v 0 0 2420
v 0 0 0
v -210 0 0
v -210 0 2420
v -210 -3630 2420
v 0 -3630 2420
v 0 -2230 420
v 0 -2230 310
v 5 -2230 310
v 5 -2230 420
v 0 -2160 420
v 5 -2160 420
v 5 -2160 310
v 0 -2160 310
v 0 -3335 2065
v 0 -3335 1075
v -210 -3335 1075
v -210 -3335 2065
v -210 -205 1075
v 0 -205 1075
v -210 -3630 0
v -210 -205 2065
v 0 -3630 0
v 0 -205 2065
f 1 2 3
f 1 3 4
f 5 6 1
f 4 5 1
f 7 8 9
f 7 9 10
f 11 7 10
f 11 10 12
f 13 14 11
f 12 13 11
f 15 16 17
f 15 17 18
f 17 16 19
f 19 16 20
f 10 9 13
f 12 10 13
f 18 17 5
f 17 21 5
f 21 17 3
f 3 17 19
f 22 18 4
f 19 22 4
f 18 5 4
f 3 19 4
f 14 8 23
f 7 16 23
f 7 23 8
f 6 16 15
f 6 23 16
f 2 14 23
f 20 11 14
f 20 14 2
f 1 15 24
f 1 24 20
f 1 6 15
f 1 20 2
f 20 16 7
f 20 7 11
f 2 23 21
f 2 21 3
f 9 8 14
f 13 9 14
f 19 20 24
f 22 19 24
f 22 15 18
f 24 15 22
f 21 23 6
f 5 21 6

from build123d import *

# Parameters (mm, degrees)
SKETCH_W     = 3630
SKETCH_H     = 2420
SKETCH_W_2   = 3130
SKETCH_H_2   = 990
PAD_DEPTH    = 210
SKETCH001_W  = 70
SKETCH001_H  = 110
PAD001_DEPTH = 5


with BuildPart() as part:
    # Sketch → Pad (new body)
    with BuildSketch(Plane.YZ):
        with Locations((-1815, 1210)):
            Rectangle(SKETCH_W, SKETCH_H)
        with Locations((-1770, 1570)):
            Rectangle(SKETCH_W_2, SKETCH_H_2, mode=Mode.SUBTRACT)
    extrude(amount=-PAD_DEPTH)

    # Sketch001 (on Face9 of Pad) → Pad001 (join)
    with BuildSketch(Plane.YZ):
        with Locations((-2195, 365)):
            Rectangle(SKETCH001_W, SKETCH001_H)
    extrude(amount=PAD001_DEPTH)


solid = part.part
